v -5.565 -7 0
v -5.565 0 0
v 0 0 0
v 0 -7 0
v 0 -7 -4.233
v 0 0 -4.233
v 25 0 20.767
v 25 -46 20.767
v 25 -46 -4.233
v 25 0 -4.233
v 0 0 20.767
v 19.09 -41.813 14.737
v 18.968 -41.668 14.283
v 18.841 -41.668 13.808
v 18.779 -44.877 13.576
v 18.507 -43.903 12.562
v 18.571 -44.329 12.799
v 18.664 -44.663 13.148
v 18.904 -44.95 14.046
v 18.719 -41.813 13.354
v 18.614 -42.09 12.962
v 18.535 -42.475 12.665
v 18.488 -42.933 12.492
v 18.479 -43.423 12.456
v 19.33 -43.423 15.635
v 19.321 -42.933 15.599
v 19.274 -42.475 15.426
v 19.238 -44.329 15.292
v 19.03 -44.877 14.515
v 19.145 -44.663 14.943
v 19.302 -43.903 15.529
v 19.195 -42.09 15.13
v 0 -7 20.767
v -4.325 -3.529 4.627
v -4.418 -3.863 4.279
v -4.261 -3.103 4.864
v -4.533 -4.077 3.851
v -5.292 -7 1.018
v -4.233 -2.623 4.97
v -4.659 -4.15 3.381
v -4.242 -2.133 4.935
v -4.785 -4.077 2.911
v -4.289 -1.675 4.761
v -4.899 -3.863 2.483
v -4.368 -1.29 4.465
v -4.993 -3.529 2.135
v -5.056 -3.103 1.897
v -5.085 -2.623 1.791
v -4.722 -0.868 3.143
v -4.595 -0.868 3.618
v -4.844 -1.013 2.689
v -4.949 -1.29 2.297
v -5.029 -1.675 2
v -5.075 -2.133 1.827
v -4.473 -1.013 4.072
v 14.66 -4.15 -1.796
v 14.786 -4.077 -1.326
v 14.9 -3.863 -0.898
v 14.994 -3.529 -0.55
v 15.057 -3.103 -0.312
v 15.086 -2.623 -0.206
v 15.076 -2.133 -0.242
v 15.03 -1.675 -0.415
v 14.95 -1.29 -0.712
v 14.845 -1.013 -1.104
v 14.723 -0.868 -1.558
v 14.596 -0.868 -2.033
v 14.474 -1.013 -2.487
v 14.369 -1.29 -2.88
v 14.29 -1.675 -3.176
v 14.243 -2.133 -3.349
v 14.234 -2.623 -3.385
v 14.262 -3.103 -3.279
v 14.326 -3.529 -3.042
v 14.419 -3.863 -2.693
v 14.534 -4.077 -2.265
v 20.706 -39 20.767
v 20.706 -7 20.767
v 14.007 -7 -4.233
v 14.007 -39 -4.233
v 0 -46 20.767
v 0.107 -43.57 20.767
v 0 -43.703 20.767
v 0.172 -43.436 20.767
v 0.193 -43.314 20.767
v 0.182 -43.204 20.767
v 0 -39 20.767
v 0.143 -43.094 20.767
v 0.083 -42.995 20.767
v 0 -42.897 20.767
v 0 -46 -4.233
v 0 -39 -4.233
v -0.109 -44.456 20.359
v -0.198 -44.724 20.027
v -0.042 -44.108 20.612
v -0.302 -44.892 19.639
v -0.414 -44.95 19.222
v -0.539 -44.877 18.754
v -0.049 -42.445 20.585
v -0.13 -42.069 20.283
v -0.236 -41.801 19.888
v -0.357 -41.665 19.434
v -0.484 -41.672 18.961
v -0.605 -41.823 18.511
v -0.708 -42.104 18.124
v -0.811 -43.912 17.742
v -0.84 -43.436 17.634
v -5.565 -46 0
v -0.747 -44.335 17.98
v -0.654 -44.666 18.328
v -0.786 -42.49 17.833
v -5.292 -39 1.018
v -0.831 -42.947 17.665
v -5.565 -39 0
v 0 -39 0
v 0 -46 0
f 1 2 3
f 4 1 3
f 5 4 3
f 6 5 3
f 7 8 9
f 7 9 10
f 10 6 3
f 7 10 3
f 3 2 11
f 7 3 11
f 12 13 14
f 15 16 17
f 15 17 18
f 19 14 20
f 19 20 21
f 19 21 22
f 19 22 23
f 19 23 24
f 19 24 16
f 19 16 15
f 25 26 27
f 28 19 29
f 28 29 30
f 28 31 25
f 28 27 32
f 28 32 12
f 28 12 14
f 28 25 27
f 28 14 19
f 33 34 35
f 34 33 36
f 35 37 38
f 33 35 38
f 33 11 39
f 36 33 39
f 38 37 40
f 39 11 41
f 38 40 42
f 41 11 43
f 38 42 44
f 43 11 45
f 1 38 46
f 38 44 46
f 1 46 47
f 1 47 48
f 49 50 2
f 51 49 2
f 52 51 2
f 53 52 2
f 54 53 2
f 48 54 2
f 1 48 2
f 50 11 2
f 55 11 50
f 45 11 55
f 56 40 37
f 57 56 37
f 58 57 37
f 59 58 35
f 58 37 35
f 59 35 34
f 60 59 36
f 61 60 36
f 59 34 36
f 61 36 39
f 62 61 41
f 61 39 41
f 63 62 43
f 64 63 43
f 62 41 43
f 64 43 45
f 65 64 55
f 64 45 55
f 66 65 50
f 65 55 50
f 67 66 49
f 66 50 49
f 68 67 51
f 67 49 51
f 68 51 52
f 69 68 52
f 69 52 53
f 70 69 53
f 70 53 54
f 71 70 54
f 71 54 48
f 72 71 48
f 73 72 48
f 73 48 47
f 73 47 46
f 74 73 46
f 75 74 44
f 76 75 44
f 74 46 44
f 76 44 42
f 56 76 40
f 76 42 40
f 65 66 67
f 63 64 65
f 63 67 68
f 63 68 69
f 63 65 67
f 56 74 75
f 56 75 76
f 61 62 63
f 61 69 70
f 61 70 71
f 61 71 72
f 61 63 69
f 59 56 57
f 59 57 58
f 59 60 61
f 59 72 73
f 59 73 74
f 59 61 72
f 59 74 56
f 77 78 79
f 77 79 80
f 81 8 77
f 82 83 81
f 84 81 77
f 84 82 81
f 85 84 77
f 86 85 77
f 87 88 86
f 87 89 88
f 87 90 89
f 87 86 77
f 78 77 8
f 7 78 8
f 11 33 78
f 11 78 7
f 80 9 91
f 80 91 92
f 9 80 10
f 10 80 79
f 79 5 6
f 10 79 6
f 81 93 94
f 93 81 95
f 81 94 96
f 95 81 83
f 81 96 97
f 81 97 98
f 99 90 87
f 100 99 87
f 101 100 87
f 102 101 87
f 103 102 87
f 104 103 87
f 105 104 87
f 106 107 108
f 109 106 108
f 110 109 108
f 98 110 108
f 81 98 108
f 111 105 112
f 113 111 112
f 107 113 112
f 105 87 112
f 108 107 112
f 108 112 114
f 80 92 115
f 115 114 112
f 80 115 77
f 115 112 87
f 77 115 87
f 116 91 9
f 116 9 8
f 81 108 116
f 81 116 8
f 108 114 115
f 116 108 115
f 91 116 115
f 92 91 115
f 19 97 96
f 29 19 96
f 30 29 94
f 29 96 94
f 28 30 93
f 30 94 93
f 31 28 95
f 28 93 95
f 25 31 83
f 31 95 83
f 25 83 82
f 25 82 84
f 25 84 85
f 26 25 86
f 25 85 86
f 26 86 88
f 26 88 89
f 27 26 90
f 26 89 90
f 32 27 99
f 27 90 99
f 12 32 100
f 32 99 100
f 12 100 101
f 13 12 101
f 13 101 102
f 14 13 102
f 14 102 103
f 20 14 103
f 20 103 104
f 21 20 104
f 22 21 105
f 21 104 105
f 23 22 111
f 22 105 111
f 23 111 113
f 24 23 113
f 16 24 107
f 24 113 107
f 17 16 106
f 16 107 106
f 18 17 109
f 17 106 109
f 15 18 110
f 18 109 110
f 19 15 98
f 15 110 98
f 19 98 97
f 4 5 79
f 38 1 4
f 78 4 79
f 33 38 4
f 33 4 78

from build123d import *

# Parameters (mm, degrees)
F1_DEPTH = 46
F3_W     = 46
F3_H     = 25
F5_DEPTH = 25
F4_W     = 32
F4_H     = 45
F6_DEPTH = 20
F2_R     = 1.65
F7_DEPTH = 20


with BuildPart() as f1:
    # F0 (on Front) → F1 (new body)
    with BuildSketch(Plane.XZ):
        Polygon((-5.564609, 0), (0, 0), (0, 20.767405), align=None)
    extrude(amount=F1_DEPTH)

    # F3 (on face) → F5 (join)
    with BuildSketch(Plane.YZ):
        with Locations((-23, 8.267405)):
            Rectangle(F3_W, F3_H)
    extrude(amount=F5_DEPTH)

    # F4 (on face) → F6 (cut)
    with BuildSketch(Plane(origin=(-5.191851, 0, 1.391152), x_dir=(0, -1, 0), z_dir=(-0.965926, 0, 0.258819))):
        with Locations((23, 10.834288)):
            Rectangle(F4_W, F4_H)
    extrude(amount=-F6_DEPTH, mode=Mode.SUBTRACT)

    # F2 (on face) → F7 (cut)
    with BuildSketch(Plane(origin=(-5.191851, 0, 1.391152), x_dir=(0, -1, 0), z_dir=(-0.965926, 0, 0.258819))):
        with Locations((2.5, 2.059773)):
            Circle(F2_R)
        with Locations((43.3, 18.459773)):
            Circle(F2_R)
    extrude(amount=-F7_DEPTH, mode=Mode.SUBTRACT)


solid = f1.part
